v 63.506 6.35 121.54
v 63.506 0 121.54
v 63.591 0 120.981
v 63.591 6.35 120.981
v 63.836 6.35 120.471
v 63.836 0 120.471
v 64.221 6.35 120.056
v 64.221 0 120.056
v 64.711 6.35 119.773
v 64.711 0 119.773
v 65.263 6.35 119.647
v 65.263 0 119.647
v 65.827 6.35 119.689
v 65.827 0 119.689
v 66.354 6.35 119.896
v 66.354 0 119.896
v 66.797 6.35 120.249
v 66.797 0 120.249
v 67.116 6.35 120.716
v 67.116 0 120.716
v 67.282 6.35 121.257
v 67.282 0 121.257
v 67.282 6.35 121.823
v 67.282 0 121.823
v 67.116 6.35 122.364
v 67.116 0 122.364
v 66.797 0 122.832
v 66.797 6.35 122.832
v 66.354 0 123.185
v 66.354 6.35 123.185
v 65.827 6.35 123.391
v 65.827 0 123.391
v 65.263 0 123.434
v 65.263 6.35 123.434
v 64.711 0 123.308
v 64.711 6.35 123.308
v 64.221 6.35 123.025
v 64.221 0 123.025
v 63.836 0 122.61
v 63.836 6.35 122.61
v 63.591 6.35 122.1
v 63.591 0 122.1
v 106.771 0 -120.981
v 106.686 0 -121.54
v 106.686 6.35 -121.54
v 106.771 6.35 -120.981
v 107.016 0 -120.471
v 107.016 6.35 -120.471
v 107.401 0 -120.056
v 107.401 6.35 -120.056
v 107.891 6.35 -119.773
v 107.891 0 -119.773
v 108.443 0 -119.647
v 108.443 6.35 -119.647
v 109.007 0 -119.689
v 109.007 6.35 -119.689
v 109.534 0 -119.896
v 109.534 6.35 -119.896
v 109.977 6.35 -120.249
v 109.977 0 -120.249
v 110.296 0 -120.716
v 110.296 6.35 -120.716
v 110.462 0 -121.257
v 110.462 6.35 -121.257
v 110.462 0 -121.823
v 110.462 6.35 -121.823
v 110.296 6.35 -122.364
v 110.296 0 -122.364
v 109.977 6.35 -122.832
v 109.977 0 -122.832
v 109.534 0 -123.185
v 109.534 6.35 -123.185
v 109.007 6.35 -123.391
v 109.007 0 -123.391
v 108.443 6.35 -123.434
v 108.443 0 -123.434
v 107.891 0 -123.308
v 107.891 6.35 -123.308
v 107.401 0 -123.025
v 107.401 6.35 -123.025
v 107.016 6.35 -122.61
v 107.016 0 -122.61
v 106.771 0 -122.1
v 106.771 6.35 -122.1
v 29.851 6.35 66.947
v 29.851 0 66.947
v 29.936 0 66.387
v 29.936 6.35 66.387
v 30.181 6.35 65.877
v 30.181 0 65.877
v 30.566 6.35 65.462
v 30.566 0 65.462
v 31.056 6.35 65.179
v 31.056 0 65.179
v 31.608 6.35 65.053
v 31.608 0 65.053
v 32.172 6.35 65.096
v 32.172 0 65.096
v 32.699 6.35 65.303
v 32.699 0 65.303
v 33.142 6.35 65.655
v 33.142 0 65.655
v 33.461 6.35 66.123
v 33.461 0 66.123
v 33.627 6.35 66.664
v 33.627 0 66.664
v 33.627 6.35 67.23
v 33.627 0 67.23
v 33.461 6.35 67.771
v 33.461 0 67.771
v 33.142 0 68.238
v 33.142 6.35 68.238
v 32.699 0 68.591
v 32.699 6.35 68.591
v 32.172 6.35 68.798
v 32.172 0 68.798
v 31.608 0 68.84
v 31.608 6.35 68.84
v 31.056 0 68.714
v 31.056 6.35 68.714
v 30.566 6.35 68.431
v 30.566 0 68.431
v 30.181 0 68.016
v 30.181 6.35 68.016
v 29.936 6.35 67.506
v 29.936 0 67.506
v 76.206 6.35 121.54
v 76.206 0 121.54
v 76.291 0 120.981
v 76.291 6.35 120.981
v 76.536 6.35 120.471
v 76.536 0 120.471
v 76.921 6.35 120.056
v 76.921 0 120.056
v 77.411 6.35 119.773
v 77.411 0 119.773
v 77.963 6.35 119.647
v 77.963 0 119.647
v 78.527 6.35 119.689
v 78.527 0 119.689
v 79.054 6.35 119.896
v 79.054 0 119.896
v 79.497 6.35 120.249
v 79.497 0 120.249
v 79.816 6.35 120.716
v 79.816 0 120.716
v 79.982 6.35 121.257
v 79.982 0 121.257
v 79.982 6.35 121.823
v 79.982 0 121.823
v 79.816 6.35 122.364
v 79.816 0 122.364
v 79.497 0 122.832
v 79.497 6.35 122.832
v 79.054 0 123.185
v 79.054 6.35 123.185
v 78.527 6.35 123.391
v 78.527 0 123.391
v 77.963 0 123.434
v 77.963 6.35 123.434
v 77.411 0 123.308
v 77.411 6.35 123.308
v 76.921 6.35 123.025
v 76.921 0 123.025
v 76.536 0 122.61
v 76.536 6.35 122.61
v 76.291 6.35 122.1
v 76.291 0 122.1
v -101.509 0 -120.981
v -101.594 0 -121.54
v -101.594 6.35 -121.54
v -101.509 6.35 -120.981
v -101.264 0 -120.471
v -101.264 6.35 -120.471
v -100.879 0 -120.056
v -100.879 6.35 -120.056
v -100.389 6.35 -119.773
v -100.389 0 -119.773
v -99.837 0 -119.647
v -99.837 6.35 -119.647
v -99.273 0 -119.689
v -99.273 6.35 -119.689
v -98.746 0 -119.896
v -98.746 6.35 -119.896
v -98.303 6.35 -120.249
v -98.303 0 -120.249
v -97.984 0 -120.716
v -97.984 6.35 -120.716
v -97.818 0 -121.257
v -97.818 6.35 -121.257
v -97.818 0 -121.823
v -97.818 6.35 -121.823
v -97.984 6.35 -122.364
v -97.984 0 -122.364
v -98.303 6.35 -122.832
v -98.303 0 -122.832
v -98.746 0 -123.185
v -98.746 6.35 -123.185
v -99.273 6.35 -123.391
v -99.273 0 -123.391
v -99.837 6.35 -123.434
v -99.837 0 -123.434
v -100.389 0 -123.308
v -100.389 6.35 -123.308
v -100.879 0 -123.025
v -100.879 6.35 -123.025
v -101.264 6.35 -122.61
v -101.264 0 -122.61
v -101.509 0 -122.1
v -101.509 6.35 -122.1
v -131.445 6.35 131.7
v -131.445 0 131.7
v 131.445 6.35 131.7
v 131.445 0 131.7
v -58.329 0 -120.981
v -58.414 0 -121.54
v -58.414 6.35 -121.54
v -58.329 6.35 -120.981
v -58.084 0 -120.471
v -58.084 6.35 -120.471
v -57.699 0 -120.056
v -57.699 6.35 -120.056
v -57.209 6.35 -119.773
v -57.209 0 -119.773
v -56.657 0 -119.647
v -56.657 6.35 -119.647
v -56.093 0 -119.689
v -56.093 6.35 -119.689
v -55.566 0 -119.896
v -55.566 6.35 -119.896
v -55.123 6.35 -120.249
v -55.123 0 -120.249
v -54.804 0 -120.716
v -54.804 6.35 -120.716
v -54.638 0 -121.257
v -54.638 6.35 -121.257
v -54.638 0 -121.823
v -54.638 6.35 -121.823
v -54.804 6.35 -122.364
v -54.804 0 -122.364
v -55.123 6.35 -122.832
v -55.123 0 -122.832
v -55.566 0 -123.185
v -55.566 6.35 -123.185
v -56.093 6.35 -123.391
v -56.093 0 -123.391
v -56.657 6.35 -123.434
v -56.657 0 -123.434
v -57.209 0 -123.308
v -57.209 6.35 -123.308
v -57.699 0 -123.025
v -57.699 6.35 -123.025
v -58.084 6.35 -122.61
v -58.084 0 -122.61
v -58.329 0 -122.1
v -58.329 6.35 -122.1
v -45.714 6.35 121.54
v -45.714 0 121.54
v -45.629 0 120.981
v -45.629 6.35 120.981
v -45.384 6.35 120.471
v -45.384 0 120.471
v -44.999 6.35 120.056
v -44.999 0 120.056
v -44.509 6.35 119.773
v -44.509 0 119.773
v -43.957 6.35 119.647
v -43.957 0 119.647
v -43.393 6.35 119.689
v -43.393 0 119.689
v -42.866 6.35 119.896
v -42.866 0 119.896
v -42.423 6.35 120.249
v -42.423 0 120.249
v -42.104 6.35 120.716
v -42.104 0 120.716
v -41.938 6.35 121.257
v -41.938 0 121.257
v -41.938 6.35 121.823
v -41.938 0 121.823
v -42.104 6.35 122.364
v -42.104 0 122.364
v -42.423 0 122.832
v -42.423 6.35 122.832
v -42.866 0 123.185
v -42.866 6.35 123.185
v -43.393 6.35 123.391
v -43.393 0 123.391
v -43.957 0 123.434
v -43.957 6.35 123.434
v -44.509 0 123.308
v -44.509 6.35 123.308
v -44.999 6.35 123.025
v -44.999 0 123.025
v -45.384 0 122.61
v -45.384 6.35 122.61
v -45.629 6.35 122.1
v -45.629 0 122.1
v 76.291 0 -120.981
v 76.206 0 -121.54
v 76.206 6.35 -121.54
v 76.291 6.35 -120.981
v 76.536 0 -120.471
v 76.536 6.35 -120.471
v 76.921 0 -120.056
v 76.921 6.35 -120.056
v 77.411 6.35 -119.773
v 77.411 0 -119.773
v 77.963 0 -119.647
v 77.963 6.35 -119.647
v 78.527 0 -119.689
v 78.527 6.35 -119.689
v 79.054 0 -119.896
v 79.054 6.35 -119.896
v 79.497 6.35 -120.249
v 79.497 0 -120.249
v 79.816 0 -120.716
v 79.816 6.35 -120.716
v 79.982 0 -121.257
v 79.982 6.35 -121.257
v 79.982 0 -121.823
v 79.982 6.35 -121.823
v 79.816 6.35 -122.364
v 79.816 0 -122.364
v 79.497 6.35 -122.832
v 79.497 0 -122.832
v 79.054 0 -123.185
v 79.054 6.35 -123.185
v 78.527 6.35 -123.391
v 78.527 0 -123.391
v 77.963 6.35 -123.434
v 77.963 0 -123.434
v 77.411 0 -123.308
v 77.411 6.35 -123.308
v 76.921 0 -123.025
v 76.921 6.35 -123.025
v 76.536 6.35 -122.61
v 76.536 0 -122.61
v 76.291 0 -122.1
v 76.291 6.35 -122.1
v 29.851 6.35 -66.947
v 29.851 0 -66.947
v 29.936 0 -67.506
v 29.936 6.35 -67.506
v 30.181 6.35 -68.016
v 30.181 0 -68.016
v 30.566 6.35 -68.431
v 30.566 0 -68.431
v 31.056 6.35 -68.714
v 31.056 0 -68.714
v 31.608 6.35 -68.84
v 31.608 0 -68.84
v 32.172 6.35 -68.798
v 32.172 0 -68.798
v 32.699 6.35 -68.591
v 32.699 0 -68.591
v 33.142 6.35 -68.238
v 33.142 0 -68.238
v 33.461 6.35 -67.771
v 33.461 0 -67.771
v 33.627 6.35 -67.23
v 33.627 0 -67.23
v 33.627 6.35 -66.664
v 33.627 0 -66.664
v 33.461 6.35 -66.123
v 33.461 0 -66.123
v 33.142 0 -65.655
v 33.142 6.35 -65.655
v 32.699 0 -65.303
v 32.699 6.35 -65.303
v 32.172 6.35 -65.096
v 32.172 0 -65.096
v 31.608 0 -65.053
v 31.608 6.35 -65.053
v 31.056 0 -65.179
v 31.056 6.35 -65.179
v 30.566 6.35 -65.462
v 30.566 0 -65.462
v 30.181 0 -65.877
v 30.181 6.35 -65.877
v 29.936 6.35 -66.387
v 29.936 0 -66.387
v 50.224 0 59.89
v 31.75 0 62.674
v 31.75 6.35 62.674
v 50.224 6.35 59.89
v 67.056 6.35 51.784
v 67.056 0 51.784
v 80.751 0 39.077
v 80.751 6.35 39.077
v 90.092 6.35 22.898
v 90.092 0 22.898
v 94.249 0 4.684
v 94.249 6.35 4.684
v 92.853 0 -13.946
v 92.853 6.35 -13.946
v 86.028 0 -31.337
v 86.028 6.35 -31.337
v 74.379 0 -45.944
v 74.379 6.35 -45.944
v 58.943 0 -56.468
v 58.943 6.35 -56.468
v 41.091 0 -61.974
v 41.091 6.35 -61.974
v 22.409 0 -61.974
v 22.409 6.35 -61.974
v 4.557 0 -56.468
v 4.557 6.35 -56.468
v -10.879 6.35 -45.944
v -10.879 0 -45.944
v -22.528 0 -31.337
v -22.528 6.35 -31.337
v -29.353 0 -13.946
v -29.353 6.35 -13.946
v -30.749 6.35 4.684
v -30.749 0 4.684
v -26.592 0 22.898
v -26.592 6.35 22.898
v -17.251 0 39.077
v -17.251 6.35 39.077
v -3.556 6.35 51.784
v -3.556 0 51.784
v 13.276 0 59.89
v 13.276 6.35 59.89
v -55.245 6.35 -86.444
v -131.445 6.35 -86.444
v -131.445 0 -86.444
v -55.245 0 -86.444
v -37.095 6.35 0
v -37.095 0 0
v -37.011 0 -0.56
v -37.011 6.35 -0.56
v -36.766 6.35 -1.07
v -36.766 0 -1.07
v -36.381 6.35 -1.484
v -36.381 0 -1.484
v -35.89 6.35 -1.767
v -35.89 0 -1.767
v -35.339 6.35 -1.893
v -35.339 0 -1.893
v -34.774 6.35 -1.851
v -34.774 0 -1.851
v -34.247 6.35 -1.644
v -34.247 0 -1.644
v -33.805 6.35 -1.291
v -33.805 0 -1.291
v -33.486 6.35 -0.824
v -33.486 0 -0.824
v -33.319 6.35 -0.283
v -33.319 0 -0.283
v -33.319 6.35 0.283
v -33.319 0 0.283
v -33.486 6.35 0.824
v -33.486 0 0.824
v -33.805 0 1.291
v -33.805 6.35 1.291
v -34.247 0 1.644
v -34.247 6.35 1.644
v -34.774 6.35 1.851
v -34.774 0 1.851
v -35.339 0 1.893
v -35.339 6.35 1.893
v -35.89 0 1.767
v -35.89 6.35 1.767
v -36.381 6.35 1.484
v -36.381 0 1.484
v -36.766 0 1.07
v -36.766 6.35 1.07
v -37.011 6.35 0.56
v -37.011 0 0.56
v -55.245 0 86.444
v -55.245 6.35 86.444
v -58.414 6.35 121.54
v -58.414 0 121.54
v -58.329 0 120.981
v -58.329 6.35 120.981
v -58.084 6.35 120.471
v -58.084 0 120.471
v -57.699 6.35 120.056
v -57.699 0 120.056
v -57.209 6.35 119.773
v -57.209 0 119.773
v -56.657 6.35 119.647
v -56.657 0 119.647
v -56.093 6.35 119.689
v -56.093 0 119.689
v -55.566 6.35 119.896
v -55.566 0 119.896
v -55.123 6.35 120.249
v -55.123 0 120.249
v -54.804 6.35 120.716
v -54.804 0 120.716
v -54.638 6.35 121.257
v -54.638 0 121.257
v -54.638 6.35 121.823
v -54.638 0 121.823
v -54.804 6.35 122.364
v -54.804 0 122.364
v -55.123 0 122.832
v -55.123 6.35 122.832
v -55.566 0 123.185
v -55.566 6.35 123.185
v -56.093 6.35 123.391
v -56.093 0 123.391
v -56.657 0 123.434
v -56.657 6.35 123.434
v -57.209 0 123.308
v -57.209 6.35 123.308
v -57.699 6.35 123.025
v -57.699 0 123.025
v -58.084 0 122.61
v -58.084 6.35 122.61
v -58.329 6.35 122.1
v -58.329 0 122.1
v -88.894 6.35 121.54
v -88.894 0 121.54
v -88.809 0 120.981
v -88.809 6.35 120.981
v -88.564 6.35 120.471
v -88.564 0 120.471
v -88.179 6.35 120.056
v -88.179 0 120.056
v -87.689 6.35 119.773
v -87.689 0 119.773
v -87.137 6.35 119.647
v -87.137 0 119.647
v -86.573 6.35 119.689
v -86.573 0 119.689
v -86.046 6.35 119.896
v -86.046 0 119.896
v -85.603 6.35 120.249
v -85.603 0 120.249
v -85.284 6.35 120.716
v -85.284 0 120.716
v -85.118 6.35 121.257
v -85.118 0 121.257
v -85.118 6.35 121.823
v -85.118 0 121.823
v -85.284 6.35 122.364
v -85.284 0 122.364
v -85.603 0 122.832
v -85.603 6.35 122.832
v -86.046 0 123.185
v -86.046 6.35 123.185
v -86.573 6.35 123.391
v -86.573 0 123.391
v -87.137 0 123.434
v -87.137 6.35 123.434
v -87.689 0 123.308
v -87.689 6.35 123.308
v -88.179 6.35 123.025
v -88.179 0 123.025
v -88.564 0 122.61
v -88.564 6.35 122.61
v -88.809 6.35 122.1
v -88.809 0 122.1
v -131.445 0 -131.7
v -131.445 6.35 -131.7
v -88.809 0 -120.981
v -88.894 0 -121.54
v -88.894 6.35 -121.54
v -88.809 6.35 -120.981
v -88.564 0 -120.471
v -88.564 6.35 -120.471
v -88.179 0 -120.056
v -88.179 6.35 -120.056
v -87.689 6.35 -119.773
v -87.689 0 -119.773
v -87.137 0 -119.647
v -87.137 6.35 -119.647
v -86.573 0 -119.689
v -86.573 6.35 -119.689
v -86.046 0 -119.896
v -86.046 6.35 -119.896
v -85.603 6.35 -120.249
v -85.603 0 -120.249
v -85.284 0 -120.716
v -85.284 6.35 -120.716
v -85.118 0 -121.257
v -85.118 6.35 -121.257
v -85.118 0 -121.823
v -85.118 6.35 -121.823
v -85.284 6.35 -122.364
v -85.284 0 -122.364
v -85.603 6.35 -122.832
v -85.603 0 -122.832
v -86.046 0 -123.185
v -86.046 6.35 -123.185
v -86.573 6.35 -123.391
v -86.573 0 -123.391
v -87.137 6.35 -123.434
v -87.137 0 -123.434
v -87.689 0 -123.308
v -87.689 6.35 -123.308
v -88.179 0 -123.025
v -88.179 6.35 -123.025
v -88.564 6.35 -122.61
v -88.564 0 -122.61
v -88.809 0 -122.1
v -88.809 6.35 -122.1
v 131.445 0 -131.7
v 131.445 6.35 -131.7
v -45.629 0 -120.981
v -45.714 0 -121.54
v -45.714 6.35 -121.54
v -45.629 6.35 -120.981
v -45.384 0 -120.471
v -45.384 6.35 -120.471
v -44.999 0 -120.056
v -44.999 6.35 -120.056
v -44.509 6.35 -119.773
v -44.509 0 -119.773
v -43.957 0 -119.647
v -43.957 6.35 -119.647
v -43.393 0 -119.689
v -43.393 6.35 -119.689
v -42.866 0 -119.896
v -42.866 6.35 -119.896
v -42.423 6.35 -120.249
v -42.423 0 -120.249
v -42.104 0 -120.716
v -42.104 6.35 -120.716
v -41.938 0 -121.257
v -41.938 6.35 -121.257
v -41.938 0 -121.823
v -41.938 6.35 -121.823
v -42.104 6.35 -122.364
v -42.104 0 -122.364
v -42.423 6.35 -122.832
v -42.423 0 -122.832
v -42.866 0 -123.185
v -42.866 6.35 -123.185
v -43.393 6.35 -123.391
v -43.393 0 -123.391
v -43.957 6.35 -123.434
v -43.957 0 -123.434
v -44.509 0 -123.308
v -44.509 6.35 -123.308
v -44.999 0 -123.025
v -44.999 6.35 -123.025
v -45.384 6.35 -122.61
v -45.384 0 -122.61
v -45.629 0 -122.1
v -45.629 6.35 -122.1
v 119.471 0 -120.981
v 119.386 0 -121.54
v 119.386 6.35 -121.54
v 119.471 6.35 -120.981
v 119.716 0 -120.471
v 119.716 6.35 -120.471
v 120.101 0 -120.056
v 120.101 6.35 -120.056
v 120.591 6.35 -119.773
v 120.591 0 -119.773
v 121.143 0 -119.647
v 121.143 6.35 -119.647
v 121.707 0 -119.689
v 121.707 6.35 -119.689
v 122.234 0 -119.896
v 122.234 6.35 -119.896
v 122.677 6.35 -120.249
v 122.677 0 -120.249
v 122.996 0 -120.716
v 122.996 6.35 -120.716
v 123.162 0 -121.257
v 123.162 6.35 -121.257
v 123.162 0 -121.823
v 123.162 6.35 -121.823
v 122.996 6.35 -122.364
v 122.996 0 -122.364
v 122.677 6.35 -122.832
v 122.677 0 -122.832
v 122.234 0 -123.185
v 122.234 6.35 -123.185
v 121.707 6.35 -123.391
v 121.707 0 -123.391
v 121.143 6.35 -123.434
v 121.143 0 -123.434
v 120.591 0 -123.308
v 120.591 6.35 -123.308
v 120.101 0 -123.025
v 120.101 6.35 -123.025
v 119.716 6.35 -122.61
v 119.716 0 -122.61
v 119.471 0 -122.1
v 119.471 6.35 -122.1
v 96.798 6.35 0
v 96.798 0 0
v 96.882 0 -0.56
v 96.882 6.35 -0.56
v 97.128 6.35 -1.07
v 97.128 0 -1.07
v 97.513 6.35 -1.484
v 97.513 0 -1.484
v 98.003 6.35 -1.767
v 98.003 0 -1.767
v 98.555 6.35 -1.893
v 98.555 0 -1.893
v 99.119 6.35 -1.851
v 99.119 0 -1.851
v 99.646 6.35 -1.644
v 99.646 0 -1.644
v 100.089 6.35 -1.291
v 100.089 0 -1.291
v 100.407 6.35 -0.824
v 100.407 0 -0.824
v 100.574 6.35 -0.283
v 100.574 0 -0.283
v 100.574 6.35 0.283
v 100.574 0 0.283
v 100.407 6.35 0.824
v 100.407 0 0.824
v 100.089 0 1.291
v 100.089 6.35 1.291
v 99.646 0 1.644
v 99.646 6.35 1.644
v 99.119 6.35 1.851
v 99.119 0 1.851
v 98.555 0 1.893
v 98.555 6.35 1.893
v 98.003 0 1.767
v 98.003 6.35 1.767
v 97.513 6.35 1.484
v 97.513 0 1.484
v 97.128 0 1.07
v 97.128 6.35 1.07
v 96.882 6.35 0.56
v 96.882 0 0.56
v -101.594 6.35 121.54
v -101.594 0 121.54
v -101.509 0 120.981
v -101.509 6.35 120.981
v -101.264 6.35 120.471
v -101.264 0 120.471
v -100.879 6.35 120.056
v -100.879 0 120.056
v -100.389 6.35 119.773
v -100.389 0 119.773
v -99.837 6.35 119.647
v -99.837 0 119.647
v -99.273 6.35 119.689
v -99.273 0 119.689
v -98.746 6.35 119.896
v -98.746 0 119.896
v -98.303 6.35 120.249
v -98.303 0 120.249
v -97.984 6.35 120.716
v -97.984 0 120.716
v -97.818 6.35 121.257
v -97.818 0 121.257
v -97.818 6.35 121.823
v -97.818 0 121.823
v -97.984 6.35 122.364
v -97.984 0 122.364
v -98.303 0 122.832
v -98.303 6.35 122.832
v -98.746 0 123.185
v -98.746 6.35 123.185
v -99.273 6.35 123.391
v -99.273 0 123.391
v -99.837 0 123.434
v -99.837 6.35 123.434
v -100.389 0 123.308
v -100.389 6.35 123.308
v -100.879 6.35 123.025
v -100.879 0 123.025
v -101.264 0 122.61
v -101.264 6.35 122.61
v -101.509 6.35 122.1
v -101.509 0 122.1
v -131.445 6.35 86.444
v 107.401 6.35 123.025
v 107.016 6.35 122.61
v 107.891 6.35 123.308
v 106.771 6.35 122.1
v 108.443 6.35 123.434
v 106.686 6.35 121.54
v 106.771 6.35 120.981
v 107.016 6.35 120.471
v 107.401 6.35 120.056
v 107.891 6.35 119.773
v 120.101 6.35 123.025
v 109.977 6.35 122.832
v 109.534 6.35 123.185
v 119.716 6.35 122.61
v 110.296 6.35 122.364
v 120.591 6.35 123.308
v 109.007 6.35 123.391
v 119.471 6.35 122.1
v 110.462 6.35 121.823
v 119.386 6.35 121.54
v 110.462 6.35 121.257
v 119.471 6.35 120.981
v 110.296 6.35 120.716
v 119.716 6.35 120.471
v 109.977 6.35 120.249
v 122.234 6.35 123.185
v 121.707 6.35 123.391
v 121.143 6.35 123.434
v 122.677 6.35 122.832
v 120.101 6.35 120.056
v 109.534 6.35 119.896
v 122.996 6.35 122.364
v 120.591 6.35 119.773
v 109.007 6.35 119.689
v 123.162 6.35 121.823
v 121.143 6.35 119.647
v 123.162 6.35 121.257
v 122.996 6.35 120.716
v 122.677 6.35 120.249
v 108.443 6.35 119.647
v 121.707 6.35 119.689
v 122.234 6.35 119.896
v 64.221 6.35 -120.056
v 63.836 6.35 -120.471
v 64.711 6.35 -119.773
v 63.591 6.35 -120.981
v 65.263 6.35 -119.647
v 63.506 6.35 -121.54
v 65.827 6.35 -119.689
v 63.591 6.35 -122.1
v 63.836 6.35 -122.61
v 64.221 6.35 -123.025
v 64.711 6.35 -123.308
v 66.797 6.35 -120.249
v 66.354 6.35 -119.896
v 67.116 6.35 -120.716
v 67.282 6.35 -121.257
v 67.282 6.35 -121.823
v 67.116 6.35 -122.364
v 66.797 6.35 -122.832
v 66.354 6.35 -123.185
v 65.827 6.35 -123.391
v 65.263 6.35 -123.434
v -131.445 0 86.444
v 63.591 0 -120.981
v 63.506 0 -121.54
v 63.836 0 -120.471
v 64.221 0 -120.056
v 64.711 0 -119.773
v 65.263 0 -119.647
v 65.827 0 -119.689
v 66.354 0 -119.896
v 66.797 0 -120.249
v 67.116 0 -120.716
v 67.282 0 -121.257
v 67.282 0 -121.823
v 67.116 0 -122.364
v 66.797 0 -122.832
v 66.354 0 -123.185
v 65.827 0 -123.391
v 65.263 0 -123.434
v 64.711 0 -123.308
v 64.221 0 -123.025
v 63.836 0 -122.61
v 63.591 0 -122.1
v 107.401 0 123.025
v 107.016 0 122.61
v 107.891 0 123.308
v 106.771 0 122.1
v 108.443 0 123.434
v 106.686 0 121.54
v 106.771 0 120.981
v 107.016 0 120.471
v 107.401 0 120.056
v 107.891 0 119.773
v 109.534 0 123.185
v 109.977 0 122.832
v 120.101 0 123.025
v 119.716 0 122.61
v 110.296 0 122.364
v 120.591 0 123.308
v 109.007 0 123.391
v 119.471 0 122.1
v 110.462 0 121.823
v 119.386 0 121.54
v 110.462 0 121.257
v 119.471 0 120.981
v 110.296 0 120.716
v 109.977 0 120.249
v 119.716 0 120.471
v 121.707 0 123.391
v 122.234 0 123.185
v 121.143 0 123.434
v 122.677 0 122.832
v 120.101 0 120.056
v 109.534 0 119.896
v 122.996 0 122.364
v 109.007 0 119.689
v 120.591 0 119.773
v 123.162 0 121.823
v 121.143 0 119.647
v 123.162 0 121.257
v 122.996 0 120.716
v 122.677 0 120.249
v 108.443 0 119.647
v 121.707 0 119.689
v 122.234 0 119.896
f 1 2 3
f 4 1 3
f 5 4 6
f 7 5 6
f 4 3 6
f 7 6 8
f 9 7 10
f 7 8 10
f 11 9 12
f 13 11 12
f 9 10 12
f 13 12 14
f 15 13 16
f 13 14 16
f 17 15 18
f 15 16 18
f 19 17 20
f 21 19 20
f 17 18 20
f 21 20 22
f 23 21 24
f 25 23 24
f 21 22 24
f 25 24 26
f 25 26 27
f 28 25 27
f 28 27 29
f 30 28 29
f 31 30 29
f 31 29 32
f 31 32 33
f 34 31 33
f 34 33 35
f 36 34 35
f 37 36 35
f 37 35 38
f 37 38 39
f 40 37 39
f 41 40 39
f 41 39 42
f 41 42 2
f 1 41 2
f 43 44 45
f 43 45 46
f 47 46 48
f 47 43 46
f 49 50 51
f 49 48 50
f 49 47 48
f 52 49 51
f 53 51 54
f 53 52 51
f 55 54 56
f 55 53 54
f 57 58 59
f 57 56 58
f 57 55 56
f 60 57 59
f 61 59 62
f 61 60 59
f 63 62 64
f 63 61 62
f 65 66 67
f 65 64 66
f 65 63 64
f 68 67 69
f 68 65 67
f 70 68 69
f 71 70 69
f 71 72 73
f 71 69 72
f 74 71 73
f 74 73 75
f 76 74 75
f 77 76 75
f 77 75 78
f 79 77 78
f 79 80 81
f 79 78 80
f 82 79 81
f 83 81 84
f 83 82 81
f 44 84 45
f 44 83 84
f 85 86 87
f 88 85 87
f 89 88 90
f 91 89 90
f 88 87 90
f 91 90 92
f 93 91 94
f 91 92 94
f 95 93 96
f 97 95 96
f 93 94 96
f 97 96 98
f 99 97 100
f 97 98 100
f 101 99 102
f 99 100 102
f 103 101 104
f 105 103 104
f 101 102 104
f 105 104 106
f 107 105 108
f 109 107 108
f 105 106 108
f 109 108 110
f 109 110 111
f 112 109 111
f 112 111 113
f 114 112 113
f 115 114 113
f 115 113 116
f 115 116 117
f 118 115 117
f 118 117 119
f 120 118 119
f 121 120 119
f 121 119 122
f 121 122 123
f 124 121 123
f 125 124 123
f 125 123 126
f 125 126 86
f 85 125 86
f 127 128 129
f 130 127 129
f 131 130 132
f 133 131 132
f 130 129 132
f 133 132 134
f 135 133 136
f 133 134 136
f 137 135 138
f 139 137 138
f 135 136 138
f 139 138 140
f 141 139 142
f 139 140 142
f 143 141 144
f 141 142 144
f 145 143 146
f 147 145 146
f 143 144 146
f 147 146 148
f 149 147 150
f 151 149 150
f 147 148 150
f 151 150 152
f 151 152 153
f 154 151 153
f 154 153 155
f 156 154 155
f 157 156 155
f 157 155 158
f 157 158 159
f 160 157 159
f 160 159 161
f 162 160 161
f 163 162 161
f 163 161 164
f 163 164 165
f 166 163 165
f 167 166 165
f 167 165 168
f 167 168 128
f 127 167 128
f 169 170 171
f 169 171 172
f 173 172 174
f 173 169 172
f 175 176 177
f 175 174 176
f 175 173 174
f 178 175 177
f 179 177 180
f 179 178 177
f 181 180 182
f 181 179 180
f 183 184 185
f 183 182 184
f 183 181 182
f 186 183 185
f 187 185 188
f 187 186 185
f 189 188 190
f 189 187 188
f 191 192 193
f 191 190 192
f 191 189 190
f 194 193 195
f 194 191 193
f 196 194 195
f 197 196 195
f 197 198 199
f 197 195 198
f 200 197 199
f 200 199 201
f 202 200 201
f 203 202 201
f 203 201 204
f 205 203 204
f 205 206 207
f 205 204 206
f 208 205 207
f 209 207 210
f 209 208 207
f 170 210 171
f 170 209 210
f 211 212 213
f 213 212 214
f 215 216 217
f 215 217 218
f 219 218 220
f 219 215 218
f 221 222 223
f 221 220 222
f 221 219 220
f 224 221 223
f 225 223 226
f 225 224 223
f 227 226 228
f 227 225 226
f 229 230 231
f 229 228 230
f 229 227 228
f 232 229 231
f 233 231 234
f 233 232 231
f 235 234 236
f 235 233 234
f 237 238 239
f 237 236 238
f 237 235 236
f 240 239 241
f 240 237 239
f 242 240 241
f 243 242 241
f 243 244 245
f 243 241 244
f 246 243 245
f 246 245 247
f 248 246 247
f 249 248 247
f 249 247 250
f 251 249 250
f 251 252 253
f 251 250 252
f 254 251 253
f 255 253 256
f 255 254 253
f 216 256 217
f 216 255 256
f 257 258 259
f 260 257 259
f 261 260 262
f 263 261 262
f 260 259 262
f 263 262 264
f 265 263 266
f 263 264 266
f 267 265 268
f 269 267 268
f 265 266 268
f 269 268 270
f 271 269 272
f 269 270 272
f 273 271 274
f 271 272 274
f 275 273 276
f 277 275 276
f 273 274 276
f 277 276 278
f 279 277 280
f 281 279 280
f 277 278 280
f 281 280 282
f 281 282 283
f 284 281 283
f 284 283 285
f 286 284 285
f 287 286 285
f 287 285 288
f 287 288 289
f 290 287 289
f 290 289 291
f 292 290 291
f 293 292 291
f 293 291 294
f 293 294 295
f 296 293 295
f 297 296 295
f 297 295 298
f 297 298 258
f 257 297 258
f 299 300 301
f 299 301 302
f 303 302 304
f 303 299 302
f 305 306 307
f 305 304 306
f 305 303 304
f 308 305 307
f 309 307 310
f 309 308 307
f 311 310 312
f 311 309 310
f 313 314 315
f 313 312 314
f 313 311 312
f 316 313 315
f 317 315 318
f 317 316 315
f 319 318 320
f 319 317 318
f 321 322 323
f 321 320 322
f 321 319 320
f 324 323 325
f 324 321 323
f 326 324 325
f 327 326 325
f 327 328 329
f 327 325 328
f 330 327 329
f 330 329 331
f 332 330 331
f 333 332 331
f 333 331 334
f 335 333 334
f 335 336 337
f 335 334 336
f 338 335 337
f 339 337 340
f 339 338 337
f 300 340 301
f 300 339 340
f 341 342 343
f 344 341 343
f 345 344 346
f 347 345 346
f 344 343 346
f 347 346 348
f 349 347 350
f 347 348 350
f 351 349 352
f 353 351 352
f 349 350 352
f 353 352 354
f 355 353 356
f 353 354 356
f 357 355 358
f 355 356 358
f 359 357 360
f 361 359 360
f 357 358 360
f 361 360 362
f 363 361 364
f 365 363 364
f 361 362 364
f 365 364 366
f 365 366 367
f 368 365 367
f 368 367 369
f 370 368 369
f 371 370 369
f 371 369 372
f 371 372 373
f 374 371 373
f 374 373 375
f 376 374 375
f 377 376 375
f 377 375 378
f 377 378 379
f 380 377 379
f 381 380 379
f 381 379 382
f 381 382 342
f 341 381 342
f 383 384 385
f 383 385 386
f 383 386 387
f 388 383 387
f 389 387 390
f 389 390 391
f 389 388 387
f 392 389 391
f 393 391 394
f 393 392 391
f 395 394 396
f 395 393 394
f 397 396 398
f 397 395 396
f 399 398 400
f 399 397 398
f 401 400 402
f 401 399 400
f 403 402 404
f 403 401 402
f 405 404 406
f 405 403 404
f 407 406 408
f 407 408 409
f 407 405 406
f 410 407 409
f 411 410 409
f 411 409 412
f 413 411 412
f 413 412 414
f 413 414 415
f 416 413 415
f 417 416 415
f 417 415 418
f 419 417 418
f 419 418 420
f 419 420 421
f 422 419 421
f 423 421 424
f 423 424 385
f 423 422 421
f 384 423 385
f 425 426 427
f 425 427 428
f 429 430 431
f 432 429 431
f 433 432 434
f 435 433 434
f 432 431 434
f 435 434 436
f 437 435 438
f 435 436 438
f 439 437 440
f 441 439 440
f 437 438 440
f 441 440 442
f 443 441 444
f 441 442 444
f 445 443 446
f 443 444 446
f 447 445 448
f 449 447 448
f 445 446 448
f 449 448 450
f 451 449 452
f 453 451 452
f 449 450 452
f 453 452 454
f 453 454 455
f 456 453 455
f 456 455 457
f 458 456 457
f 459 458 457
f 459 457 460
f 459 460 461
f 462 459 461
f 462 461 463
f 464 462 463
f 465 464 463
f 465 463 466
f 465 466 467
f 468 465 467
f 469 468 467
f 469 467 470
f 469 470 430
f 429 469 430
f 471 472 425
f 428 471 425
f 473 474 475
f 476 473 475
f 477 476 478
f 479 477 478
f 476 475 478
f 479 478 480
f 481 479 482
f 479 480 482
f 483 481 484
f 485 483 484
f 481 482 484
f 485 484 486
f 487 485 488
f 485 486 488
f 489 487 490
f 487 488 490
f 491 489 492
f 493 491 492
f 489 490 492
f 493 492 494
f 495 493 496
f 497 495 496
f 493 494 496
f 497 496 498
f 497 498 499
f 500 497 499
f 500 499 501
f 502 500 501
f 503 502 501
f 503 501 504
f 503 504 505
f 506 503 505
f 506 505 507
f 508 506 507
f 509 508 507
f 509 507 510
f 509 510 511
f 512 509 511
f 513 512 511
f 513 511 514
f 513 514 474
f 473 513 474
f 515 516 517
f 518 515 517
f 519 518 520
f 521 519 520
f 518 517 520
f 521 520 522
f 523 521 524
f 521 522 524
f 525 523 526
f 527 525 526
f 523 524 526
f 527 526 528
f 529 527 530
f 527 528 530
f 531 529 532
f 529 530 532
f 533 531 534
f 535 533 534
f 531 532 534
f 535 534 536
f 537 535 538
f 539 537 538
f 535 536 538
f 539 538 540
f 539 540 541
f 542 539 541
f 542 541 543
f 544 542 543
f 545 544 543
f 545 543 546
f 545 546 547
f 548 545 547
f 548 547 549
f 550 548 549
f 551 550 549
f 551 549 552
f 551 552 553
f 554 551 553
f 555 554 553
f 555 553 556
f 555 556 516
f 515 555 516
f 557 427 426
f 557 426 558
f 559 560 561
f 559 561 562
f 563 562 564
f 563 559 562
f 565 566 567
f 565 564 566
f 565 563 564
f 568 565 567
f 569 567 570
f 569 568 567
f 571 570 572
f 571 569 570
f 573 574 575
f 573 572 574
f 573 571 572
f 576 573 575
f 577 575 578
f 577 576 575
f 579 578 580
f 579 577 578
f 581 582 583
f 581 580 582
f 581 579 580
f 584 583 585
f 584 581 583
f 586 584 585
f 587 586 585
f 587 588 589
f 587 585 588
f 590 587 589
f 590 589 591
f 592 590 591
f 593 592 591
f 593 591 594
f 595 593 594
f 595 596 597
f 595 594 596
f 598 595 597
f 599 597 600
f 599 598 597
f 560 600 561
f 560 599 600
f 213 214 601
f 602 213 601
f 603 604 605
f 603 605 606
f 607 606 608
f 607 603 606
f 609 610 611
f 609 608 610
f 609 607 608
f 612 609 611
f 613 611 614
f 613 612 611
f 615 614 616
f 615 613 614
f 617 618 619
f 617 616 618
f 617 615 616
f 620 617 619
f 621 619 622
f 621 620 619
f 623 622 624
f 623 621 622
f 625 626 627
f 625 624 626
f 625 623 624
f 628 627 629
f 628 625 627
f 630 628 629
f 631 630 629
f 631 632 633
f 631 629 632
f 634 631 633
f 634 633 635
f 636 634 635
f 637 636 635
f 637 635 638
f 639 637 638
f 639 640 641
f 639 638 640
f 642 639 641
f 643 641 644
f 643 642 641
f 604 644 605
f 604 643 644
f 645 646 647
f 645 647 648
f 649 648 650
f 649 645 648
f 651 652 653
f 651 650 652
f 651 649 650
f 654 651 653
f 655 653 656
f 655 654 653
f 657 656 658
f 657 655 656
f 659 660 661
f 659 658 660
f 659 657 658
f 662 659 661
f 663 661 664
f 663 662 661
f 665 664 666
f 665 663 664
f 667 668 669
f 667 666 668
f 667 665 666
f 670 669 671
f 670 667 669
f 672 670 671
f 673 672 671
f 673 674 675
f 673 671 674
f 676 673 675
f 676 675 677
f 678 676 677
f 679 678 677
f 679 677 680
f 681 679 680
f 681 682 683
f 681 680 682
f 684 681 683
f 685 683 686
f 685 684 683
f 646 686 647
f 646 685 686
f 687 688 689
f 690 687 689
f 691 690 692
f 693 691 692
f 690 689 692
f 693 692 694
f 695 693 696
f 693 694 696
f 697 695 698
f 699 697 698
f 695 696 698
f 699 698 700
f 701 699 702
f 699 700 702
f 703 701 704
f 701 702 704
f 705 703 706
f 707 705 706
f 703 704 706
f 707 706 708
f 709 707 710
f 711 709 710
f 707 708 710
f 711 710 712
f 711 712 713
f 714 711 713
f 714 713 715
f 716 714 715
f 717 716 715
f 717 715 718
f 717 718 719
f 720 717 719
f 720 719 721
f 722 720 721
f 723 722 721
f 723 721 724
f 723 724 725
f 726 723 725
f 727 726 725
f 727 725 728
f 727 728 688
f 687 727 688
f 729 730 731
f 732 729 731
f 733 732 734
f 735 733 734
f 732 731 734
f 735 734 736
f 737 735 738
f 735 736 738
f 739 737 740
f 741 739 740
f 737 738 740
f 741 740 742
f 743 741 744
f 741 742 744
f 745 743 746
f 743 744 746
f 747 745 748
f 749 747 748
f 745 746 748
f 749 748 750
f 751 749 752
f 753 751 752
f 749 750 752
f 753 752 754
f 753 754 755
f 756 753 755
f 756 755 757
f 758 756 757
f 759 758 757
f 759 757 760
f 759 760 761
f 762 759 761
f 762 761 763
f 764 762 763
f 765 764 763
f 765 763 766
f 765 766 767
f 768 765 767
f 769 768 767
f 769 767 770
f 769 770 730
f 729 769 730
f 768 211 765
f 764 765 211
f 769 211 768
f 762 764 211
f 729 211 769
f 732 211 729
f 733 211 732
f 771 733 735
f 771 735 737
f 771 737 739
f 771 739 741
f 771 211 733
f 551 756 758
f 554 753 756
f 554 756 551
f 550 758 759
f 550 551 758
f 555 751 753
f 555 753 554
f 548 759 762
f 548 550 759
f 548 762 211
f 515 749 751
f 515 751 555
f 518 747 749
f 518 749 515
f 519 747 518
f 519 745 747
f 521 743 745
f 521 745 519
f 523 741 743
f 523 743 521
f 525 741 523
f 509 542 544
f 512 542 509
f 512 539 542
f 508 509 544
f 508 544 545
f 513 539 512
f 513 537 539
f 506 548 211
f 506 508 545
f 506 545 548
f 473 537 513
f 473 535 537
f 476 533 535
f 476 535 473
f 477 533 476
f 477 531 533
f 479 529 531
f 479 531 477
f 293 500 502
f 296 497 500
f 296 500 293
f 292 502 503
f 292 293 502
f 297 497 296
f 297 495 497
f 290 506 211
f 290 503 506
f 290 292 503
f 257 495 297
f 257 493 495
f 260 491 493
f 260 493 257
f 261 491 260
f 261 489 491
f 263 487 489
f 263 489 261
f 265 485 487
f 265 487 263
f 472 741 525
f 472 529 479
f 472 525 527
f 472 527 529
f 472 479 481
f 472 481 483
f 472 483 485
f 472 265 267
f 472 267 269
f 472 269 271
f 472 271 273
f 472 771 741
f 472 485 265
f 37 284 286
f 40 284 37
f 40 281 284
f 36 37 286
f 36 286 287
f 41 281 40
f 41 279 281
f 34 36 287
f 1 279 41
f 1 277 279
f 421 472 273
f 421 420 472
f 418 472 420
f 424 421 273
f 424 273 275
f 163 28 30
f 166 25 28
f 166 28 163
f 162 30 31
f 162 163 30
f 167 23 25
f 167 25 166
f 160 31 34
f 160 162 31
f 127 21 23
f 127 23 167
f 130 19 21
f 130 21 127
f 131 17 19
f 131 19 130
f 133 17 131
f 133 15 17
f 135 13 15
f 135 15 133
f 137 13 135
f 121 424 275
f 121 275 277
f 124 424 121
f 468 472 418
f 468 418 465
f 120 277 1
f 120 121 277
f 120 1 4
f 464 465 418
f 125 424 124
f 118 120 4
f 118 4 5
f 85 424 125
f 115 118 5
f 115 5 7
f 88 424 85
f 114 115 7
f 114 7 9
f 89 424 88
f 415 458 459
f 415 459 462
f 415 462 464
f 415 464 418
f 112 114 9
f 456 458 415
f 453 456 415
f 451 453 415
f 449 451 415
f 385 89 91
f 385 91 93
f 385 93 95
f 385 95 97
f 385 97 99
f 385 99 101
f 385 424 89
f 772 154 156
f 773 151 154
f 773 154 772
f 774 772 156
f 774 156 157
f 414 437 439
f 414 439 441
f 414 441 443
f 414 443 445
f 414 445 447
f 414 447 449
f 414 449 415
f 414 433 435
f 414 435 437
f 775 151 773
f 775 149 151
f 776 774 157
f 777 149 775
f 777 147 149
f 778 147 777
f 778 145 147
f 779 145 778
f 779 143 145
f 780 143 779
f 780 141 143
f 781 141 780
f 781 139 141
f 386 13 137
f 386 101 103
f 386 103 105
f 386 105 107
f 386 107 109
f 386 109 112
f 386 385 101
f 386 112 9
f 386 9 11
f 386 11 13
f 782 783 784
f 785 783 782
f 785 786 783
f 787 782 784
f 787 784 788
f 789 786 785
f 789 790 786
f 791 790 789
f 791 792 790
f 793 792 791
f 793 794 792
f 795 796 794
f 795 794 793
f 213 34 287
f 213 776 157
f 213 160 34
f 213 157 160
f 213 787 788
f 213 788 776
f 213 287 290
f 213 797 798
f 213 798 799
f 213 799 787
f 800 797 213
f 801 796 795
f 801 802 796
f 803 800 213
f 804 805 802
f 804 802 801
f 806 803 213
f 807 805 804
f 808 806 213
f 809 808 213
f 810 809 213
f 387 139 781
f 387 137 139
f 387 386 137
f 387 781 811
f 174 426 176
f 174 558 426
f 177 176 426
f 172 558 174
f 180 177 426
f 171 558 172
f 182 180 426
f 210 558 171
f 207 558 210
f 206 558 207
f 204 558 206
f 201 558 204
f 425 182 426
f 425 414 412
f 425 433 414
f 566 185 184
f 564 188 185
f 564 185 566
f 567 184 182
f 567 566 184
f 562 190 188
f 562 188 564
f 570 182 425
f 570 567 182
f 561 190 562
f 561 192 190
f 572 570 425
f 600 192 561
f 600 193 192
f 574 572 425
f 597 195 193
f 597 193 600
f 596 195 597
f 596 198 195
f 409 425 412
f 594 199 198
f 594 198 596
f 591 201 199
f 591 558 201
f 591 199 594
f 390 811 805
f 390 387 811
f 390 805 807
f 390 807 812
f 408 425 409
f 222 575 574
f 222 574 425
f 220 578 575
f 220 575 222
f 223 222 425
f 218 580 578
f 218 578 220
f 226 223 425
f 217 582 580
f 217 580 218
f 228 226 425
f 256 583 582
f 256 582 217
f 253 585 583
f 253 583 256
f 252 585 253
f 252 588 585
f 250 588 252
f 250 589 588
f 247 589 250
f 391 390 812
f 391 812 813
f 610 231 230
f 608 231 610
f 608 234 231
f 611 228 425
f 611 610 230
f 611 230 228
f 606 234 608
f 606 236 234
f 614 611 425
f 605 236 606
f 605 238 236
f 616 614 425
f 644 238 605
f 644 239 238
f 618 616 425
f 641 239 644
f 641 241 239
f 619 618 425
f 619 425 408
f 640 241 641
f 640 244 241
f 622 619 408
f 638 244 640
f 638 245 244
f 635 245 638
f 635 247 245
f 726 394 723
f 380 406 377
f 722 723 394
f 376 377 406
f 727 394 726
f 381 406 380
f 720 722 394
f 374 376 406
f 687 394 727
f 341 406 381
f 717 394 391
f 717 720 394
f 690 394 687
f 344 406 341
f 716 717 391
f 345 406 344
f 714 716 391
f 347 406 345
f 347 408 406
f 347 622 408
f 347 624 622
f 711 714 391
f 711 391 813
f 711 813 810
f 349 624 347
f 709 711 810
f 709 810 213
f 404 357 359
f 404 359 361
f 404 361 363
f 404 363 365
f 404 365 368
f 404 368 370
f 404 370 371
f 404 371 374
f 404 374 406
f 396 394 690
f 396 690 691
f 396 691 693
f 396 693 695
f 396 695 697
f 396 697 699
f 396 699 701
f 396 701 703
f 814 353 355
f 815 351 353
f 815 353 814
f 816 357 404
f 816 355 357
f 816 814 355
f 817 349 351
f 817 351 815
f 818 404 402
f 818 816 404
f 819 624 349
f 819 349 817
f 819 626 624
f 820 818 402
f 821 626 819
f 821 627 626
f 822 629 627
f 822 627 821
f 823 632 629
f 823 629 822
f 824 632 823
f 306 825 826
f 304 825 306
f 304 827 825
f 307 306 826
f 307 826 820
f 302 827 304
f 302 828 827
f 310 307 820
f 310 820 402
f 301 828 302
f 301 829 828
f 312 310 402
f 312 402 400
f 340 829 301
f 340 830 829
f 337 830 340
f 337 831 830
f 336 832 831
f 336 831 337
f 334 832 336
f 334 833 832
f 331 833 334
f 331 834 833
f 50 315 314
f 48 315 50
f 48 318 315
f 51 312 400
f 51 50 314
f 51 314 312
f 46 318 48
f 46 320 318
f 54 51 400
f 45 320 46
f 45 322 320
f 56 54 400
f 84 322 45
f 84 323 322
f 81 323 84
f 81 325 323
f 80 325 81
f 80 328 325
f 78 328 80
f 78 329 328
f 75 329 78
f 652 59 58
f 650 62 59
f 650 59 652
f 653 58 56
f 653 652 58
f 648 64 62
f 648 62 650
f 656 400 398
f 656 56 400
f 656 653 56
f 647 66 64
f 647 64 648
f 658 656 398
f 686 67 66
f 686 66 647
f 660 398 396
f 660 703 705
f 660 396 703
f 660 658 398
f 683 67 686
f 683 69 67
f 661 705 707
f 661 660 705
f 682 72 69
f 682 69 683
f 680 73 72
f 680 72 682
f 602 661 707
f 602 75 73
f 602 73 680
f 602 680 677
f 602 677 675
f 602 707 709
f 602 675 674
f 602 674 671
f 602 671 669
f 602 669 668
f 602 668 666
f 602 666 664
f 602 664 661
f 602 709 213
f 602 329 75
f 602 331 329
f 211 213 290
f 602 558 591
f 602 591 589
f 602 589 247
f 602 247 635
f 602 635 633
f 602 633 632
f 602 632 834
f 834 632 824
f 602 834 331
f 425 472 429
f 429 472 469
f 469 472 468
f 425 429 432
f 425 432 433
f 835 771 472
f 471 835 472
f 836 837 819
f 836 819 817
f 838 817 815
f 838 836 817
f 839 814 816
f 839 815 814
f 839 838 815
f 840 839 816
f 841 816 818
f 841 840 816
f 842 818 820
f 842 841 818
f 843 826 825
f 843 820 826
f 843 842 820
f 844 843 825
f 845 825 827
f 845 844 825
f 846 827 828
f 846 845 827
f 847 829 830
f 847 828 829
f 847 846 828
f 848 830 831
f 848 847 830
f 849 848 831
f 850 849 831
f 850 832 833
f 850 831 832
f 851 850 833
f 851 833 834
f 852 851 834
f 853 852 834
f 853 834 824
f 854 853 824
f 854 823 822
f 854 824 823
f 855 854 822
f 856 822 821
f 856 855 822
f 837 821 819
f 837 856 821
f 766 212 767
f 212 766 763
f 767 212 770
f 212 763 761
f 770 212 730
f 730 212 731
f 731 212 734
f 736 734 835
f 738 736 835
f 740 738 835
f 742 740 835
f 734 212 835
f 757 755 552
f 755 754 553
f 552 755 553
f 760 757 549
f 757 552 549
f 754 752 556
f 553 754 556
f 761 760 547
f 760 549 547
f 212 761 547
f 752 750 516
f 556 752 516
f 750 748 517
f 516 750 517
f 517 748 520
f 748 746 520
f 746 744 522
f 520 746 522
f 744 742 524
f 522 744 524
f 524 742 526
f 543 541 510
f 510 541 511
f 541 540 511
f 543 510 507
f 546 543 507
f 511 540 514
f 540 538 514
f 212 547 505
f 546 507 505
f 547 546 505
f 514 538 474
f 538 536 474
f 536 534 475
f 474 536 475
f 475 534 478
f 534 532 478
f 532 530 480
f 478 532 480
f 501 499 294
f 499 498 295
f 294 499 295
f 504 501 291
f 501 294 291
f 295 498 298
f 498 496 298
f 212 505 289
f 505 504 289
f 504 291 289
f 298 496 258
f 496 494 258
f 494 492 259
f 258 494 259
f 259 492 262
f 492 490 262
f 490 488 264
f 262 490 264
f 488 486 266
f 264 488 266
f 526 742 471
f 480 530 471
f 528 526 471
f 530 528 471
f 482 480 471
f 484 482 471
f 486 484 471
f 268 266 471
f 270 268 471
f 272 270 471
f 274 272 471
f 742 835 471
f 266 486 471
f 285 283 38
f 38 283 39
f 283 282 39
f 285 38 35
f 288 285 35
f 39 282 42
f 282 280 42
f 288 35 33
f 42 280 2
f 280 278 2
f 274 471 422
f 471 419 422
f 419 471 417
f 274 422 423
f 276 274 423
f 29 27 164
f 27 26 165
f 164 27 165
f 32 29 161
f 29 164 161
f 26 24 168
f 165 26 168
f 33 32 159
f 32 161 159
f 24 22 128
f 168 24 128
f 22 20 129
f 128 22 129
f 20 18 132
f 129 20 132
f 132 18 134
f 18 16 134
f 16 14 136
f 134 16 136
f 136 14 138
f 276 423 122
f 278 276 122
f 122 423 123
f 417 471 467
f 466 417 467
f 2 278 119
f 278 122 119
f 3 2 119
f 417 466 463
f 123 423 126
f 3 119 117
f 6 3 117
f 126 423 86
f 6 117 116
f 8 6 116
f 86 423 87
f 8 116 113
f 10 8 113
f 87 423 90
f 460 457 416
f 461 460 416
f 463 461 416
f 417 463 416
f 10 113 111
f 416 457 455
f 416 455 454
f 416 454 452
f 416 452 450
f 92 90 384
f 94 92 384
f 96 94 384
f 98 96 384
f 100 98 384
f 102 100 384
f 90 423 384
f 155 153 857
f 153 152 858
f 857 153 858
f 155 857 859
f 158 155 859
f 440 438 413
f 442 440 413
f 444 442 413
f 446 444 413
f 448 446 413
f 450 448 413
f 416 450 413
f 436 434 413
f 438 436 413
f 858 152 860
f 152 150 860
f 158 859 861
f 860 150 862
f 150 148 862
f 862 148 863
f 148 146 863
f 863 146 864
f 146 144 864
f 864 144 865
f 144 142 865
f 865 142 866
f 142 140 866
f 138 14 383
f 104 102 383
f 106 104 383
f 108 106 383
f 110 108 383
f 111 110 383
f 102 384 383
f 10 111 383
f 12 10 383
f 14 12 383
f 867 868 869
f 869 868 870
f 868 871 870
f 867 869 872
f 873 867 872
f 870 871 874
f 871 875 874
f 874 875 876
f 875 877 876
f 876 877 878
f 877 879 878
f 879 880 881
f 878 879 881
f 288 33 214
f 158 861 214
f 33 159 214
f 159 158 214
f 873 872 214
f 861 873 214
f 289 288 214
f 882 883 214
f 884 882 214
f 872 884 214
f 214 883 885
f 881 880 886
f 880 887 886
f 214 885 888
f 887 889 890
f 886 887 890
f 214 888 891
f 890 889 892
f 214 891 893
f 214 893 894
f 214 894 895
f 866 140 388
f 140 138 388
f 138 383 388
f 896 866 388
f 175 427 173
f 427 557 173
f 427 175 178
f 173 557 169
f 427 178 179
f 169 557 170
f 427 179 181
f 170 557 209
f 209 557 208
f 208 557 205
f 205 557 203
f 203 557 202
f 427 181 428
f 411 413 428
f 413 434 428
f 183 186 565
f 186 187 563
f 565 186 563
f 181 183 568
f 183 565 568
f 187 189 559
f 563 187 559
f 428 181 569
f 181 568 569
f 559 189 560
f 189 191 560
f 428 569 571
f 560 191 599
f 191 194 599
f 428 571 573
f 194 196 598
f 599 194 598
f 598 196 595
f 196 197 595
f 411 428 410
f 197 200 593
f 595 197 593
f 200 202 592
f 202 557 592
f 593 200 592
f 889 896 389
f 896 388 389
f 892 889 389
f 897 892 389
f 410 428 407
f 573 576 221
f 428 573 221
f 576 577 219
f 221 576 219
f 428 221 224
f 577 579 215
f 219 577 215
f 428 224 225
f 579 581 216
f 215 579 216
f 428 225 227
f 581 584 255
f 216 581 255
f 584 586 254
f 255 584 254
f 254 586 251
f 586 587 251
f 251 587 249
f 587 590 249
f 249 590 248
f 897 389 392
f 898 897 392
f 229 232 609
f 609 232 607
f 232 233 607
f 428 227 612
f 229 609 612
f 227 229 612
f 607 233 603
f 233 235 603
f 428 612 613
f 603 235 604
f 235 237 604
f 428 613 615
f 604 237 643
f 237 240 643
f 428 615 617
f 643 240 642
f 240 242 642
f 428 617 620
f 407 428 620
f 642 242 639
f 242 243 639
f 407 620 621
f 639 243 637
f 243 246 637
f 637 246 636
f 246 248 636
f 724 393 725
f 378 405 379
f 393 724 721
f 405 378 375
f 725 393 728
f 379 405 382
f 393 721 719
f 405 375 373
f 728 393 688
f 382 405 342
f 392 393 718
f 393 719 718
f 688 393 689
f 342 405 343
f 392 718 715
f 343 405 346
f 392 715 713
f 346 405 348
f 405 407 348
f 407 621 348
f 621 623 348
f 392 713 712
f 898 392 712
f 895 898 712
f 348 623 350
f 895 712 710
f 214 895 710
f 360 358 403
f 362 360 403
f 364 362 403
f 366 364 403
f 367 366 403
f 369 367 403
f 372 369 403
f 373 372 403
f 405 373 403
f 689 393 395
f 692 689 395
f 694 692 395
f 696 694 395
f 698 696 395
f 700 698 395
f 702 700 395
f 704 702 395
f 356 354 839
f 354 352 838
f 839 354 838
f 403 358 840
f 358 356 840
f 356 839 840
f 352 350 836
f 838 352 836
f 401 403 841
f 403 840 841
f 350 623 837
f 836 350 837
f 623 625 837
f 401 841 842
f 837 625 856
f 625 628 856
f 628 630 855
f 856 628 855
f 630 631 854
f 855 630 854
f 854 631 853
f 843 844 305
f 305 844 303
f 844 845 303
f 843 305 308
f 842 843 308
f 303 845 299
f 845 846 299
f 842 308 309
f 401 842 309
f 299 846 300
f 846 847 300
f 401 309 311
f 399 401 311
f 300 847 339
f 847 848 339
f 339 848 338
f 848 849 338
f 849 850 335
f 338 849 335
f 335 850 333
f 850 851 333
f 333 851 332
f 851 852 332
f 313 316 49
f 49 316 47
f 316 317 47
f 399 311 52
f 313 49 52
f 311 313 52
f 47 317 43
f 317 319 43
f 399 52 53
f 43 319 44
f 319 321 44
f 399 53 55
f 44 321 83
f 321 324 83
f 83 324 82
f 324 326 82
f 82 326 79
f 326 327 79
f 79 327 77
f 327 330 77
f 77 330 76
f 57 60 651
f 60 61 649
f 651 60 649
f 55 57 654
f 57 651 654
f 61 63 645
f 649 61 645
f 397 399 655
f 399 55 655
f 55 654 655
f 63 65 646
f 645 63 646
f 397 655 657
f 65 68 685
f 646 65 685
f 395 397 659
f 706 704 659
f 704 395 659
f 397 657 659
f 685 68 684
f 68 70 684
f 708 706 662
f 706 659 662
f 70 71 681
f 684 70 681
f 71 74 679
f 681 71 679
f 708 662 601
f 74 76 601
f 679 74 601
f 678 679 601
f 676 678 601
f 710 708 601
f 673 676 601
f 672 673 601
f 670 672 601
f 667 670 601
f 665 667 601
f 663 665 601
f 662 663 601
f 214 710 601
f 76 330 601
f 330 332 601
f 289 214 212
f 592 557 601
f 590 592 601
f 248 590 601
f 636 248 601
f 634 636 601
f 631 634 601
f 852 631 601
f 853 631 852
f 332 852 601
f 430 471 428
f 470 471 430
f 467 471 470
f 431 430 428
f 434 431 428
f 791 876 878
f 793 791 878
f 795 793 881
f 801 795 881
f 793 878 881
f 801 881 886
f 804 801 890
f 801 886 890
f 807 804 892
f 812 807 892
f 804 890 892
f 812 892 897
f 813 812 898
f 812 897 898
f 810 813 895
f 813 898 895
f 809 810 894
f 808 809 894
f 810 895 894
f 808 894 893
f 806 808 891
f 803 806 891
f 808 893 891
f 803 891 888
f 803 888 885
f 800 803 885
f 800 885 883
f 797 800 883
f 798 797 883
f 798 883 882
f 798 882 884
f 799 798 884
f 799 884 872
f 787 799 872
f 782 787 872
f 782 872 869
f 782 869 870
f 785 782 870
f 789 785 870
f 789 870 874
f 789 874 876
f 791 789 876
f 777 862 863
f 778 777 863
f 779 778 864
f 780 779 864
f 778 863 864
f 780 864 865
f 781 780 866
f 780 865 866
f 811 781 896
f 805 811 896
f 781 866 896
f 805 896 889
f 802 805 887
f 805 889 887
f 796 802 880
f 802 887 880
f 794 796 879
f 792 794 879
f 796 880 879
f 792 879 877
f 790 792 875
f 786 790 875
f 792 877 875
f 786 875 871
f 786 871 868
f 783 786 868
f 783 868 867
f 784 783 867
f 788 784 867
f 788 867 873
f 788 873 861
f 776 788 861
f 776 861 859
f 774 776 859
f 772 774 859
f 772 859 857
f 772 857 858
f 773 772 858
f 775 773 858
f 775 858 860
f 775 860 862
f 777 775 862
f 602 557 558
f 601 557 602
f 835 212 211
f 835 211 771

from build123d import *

# Parameters (mm, degrees)
SKETCH1_W             = 262.89
SKETCH1_H             = 263.40054
SKETCH1_R             = 62.6745
BOSS_EXTRUDE1_DEPTH   = 6.35
F_6_CLEARANCE_HOLE1_D = 3.7973
F_6_CLEARANCE_HOLE2_D = 3.7973
F_6_CLEARANCE_HOLE3_D = 3.7973
SKETCH9_W             = 76.2
SKETCH9_H             = 172.887951896
CUT_EXTRUDE1_DEPTH    = 7.62


with BuildPart() as part:
    # Sketch1 → Boss-Extrude1 (new body)
    with BuildSketch(Plane(origin=(0, 0, 0), x_dir=(1, 0, 0), z_dir=(0, 1, 0))):
        Rectangle(SKETCH1_W, SKETCH1_H)
        with Locations(Location((31.75, 0, 0), (0, 0, 270))):
            Circle(SKETCH1_R, mode=Mode.SUBTRACT)
    extrude(amount=BOSS_EXTRUDE1_DEPTH)

    # #6 Clearance Hole1 (through all)
    with Locations(Plane(origin=(0, 6.35, 0), x_dir=(1, 0, 0), z_dir=(0, 1, 0))):
        with Locations((31.75, 66.94678), (-35.19678, 0), (98.69678, 0), (31.75, -66.94678)):
            Hole(F_6_CLEARANCE_HOLE1_D / 2)

    # #6 Clearance Hole2 (through all)
    with Locations(Plane(origin=(0, 6.35, 0), x_dir=(1, 0, 0), z_dir=(0, 1, 0))):
        with Locations((121.285, -121.54027), (108.585, -121.54027), (78.105, -121.54027), (65.405, -121.54027)):
            f_6_clearance_hole2 = Hole(F_6_CLEARANCE_HOLE2_D / 2)

    # Mirror1: #6 Clearance Hole2 across plane
    add(f_6_clearance_hole2.mirror(Plane.XY), mode=Mode.SUBTRACT)

    # #6 Clearance Hole3 (through all)
    with Locations(Plane(origin=(0, 6.35, 0), x_dir=(1, 0, 0), z_dir=(0, 1, 0))):
        with Locations((-43.815, -121.54027), (-56.515, -121.54027), (-86.995, -121.54027), (-99.695, -121.54027)):
            f_6_clearance_hole3 = Hole(F_6_CLEARANCE_HOLE3_D / 2)

    # Mirror2: #6 Clearance Hole3 across plane
    add(f_6_clearance_hole3.mirror(Plane.XY), mode=Mode.SUBTRACT)

    # Sketch9 → Cut-Extrude1 (cut)
    with BuildSketch(Plane(origin=(0, 6.35, 0), x_dir=(1, 0, 0), z_dir=(0, 1, 0))):
        with Locations((-93.345, 0)):
            Rectangle(SKETCH9_W, SKETCH9_H)
    extrude(amount=-CUT_EXTRUDE1_DEPTH, mode=Mode.SUBTRACT)


solid = part.part
